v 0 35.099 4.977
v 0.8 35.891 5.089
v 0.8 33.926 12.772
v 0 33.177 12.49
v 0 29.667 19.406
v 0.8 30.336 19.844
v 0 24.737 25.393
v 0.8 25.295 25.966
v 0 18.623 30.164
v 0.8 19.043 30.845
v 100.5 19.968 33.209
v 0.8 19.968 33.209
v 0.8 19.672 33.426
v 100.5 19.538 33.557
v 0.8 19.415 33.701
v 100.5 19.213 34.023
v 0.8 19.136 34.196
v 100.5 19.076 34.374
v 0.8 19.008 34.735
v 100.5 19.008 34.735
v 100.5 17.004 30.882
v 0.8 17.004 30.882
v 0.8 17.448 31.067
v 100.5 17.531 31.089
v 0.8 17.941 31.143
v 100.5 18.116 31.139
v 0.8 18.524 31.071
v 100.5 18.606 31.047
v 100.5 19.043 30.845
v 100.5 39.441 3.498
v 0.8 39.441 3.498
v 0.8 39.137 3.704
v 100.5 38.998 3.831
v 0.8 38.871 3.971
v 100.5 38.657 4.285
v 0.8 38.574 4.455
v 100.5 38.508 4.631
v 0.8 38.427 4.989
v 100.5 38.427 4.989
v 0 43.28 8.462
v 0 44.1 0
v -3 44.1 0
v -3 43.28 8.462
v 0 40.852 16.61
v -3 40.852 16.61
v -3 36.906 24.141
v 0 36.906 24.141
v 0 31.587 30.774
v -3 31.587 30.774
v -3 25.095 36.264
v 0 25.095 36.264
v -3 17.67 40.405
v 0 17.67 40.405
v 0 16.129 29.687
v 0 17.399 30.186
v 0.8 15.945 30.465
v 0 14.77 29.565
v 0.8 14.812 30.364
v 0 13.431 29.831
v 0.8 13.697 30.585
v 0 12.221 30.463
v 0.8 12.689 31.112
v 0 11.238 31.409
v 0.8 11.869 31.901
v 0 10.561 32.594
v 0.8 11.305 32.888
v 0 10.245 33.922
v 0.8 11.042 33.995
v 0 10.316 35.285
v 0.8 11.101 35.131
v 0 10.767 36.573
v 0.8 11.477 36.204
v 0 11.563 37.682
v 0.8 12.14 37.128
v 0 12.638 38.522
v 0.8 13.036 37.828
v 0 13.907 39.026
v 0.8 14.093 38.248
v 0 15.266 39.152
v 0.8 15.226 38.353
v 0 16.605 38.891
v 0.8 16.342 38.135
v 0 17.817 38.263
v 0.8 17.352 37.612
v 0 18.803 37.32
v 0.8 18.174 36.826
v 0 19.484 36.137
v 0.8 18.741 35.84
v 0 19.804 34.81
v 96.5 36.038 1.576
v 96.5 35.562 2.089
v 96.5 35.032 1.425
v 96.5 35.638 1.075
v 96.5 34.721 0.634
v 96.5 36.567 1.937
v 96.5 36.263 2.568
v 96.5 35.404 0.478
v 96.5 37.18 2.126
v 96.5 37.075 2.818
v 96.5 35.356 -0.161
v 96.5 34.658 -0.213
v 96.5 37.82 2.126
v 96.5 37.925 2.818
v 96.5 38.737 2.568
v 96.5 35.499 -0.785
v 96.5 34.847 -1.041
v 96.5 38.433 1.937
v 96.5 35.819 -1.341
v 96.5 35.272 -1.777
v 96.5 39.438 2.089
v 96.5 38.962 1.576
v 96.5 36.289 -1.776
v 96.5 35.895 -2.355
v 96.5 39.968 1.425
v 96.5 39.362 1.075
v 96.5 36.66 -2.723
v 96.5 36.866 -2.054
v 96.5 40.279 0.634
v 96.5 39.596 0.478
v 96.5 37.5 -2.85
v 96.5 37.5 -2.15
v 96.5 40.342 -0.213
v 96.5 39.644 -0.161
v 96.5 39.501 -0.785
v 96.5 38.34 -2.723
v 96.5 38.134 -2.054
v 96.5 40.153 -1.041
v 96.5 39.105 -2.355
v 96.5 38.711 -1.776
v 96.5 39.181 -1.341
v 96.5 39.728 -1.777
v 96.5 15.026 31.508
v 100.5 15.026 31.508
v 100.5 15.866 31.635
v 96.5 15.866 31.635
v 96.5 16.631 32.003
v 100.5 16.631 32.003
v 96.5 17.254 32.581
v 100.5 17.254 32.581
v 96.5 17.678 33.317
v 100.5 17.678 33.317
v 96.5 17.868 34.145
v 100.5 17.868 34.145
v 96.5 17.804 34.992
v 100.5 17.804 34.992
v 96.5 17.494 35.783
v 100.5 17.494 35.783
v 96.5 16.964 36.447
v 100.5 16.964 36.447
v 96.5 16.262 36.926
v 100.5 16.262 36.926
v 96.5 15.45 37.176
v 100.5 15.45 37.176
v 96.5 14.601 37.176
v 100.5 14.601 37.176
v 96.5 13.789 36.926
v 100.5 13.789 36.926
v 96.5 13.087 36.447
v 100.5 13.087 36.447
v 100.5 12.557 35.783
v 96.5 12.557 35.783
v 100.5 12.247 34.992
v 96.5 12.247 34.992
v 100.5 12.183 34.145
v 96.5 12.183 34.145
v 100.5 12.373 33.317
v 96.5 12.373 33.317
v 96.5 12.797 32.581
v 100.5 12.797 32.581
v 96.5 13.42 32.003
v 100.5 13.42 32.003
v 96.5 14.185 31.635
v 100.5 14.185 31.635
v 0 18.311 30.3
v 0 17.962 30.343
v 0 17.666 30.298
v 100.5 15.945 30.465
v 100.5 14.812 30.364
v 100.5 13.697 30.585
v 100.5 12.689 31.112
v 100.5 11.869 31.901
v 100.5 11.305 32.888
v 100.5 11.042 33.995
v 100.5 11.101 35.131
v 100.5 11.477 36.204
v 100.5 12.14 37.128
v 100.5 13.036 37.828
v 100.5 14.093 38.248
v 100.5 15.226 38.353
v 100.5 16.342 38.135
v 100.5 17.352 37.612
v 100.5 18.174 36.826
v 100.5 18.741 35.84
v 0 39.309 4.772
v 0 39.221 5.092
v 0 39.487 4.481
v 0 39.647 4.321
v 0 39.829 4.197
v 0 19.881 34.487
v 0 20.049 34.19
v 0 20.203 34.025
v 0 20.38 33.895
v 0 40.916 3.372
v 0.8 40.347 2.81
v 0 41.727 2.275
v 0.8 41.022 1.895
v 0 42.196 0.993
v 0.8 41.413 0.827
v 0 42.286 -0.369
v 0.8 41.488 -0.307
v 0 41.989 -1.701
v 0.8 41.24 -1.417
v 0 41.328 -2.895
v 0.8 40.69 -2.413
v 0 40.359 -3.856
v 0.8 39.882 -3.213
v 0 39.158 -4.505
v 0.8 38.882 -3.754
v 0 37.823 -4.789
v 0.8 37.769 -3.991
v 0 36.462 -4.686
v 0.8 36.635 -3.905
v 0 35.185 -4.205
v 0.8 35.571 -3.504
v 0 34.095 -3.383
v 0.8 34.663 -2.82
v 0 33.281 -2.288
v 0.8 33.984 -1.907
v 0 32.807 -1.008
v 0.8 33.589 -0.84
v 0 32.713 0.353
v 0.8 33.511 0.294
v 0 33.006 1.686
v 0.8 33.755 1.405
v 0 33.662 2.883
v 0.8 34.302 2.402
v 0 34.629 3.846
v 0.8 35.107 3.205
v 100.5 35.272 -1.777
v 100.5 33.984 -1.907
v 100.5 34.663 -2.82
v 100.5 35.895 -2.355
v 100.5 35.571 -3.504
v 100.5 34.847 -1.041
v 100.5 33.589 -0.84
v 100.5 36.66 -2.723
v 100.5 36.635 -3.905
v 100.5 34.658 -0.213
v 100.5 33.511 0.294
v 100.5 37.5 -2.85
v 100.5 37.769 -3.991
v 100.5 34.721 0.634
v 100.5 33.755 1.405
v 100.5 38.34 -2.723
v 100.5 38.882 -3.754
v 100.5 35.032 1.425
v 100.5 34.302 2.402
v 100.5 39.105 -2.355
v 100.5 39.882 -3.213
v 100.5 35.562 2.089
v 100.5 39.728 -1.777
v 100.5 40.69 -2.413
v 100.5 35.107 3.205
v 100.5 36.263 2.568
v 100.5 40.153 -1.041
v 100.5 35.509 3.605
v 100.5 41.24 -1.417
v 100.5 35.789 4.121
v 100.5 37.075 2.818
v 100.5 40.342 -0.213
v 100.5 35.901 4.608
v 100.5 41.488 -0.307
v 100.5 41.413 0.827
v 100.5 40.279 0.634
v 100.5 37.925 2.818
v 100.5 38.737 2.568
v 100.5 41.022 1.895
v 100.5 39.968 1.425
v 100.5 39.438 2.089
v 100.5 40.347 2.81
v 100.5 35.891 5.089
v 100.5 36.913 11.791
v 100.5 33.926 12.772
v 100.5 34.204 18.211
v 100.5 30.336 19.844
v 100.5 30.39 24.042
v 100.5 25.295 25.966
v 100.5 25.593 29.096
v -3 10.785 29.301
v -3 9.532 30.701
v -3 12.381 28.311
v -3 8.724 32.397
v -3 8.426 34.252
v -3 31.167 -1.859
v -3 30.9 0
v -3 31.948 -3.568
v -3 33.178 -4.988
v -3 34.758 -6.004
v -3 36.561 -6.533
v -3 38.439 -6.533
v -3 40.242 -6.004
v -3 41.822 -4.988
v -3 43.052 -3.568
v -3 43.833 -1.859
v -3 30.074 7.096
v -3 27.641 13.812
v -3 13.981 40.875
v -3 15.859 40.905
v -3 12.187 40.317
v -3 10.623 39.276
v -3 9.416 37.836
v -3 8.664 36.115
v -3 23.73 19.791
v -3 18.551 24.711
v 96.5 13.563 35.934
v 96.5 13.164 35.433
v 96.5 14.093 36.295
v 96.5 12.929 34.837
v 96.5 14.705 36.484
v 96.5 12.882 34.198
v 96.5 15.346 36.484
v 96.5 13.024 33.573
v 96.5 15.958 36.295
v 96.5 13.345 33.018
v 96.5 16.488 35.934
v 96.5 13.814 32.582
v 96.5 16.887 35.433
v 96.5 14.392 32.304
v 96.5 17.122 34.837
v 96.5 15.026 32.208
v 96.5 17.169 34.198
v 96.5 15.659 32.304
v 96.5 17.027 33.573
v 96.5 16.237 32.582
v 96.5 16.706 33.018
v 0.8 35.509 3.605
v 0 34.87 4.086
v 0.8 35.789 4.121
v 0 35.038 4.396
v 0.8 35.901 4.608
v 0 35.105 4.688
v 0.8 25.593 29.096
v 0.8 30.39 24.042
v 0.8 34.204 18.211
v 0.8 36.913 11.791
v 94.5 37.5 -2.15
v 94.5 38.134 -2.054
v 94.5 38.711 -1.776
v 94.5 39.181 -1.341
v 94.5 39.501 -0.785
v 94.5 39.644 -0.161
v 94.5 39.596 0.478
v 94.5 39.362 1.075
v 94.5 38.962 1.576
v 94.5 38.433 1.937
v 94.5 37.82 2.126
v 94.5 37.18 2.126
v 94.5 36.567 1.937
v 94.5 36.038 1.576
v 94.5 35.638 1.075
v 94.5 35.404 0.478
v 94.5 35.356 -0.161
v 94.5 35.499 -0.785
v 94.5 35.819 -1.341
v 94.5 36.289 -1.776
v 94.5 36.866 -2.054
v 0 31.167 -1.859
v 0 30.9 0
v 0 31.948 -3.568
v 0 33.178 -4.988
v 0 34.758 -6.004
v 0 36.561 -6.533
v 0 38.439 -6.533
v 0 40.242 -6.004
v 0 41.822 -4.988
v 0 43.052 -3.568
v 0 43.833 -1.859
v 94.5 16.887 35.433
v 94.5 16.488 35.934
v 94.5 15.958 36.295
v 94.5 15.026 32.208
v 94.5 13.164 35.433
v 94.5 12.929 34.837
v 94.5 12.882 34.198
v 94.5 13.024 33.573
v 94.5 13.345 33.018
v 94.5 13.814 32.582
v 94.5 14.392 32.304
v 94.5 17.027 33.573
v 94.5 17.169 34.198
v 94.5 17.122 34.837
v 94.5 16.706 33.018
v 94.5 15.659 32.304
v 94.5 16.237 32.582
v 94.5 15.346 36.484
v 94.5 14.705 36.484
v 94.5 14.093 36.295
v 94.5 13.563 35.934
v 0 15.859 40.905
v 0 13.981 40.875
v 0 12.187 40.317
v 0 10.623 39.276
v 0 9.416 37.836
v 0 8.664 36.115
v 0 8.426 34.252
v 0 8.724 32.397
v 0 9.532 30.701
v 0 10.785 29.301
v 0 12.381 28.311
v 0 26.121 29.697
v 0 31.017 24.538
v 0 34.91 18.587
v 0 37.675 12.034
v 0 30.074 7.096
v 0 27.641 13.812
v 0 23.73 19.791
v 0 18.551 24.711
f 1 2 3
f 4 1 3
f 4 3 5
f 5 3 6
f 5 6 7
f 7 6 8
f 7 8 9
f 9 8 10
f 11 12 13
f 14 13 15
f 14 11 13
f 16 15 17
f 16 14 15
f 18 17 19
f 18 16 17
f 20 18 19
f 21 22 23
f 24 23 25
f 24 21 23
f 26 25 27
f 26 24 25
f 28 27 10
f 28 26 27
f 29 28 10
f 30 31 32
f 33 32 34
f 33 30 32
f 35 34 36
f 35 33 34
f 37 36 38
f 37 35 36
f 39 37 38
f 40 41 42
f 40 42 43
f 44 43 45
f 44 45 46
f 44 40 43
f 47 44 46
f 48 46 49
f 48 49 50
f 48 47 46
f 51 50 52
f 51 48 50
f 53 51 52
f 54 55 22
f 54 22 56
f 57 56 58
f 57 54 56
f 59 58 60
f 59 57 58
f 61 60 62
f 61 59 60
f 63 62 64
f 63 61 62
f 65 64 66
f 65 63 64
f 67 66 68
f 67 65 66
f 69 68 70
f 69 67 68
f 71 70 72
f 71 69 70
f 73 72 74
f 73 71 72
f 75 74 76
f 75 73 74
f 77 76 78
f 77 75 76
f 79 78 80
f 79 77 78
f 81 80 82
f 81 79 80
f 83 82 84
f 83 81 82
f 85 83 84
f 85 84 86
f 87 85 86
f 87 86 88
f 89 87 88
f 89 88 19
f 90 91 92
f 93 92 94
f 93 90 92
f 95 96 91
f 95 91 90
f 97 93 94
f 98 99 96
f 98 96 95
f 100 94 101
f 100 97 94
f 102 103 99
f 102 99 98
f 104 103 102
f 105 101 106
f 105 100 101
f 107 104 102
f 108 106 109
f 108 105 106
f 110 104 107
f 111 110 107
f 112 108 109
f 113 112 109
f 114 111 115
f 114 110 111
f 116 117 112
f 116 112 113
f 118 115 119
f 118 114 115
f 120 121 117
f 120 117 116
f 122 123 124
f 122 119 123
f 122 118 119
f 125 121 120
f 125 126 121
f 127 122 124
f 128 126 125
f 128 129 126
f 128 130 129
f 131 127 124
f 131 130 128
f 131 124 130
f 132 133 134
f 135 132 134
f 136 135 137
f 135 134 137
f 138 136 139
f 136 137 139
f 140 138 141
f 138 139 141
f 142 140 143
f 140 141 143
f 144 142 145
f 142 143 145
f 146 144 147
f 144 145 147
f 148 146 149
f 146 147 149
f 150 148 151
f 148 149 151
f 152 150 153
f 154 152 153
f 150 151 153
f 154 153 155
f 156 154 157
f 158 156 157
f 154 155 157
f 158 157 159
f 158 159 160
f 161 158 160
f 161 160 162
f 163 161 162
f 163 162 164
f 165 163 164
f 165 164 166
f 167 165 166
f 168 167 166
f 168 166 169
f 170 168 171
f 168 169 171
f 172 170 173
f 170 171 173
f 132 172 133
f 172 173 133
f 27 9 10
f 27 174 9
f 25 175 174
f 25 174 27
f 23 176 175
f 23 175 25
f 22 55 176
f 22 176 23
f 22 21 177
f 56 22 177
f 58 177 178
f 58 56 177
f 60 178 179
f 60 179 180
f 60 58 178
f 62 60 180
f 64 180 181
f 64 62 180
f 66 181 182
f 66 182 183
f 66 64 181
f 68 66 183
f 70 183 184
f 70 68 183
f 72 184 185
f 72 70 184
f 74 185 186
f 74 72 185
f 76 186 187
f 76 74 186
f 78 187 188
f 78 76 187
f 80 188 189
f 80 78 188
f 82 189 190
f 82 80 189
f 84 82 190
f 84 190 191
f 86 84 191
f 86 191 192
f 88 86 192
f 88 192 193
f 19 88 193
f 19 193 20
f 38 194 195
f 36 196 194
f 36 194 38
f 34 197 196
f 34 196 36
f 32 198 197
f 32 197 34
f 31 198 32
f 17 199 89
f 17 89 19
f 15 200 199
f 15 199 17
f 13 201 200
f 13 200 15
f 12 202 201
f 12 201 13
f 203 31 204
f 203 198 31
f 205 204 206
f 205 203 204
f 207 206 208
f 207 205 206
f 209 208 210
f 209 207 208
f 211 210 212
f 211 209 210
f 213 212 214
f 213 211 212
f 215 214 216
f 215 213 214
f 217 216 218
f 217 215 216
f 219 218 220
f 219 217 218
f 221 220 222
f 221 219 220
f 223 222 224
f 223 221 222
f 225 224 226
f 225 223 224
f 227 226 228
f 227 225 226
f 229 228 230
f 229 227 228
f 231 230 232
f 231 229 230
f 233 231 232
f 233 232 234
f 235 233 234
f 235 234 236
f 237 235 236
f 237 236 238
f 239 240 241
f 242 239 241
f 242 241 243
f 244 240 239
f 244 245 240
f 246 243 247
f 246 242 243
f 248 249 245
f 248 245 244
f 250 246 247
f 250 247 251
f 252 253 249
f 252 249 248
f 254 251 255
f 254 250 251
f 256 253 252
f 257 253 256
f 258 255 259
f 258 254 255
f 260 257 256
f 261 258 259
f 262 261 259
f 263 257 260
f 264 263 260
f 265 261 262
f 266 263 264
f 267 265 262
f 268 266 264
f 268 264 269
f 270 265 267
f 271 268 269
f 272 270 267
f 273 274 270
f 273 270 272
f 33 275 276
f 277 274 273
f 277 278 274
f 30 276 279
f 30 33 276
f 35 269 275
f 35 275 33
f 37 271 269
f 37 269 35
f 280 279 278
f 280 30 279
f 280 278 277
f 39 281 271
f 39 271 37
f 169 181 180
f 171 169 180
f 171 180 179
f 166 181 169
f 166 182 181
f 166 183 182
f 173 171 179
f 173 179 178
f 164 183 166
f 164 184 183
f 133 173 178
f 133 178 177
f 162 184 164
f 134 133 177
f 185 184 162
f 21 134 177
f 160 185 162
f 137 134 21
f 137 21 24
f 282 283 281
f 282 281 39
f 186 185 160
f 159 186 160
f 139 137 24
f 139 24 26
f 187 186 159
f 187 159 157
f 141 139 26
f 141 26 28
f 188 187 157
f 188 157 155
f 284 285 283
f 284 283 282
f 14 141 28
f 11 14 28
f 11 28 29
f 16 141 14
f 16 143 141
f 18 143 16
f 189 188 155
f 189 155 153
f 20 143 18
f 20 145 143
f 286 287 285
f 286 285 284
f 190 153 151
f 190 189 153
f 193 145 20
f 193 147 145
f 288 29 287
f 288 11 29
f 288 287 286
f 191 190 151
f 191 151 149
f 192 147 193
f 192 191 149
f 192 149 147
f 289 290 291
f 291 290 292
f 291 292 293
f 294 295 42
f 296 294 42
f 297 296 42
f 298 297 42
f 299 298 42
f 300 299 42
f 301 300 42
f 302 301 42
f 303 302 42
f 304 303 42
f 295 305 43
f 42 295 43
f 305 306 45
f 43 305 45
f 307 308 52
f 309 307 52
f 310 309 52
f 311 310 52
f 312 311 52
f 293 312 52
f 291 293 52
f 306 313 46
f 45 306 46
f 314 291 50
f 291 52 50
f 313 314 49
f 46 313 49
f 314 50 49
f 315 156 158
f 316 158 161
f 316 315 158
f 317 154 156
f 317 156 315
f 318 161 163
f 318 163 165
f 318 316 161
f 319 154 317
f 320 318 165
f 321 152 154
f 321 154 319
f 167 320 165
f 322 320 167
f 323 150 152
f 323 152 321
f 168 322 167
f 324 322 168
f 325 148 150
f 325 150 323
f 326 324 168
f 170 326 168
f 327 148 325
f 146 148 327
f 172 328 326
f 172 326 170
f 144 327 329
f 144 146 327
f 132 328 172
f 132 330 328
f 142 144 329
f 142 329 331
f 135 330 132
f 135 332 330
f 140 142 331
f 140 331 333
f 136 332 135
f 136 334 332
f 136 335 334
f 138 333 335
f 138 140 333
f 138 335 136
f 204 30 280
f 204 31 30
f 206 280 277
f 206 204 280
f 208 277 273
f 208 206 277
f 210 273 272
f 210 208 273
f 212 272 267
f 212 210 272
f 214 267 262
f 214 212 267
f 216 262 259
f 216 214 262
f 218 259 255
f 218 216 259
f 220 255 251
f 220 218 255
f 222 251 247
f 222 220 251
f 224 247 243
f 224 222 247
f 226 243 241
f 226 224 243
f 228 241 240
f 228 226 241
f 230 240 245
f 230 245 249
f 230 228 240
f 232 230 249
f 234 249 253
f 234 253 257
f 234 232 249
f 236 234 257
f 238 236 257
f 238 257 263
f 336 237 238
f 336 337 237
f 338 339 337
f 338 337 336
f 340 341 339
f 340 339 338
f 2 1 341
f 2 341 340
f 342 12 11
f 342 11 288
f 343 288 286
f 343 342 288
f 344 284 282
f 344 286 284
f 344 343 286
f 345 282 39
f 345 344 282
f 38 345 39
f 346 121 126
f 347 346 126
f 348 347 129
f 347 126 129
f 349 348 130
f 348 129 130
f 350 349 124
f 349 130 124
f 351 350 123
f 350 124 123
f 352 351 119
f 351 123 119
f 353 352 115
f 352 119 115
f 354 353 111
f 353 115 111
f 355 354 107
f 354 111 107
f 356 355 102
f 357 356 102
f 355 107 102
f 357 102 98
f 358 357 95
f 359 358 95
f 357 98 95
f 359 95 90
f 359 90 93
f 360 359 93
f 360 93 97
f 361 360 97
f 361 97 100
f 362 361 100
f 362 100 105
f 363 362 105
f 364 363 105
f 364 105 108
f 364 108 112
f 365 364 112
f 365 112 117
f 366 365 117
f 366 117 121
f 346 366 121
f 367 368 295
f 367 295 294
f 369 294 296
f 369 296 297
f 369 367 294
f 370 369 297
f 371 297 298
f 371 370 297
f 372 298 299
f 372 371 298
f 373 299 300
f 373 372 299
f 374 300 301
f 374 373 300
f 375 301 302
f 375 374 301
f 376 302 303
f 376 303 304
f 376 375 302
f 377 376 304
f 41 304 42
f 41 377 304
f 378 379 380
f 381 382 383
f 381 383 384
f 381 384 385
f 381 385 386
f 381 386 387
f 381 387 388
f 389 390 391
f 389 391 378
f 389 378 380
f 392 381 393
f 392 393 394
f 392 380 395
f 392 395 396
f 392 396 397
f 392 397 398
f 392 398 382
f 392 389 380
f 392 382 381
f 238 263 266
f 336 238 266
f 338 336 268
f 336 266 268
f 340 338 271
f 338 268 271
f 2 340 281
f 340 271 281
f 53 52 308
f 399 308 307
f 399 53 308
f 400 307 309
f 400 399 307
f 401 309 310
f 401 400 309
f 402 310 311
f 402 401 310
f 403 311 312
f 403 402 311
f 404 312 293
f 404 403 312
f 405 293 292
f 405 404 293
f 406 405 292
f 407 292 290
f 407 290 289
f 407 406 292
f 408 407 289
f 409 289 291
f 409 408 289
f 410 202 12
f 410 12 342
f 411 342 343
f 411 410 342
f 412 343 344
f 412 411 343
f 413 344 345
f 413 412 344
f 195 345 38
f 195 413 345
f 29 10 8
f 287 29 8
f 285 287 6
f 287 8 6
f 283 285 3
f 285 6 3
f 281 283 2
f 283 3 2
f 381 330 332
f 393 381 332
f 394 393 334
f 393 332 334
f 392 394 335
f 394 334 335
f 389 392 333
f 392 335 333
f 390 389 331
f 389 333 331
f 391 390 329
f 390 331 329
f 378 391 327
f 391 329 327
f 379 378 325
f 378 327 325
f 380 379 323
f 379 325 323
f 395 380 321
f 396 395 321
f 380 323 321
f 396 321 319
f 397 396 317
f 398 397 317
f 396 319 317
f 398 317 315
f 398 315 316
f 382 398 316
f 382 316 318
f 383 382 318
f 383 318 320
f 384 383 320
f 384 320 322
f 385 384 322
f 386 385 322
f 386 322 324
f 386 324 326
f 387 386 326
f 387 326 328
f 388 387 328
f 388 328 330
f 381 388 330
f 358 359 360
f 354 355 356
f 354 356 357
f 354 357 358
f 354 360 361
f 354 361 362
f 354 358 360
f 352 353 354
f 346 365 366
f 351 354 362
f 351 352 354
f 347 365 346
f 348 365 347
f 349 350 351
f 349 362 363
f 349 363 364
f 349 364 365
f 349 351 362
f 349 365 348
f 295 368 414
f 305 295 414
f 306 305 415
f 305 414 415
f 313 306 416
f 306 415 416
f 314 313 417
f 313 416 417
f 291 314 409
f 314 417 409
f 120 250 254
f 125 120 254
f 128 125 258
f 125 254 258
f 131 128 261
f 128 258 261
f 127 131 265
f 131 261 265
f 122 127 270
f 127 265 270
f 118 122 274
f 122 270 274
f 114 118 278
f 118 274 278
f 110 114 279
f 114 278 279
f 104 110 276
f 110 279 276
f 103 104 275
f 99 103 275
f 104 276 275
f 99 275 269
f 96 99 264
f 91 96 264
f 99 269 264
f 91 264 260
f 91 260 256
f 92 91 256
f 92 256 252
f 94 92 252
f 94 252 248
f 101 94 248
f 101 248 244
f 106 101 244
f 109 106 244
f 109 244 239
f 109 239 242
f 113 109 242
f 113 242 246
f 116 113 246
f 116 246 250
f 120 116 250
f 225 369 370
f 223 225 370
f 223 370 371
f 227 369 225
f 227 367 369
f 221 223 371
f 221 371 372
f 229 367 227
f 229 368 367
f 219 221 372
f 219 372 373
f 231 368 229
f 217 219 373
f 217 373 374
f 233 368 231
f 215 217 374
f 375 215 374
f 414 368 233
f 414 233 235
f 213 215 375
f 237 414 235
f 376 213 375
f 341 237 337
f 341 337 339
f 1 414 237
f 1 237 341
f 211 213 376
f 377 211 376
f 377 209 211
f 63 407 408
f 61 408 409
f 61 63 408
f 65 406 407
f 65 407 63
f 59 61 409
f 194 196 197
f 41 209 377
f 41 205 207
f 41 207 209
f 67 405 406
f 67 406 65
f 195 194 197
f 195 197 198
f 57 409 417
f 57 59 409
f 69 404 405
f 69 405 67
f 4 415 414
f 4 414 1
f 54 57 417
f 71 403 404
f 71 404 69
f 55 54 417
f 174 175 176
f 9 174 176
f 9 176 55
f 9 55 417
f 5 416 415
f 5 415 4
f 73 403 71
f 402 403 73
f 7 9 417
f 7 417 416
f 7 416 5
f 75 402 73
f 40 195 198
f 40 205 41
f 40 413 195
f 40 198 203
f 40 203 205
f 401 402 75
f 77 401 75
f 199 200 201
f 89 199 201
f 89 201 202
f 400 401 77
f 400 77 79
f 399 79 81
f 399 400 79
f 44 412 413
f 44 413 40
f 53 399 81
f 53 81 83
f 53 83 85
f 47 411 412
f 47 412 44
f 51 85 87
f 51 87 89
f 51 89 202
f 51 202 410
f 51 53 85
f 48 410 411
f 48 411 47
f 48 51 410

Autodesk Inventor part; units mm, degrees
ref_plane "YZ Plane" through (0, 0, 0) normal (1, 0, 0) x (0, 1, 0)
ref_plane "XZ Plane" through (0, 0, 0) normal (0, 1, 0) x (-1, 0, 0)
ref_plane "XY Plane" through (0, 0, 0) normal (0, 0, 1) x (1, 0, 0)
sketch "Sketch1" plane through (0, 0, 0) normal (1, 0, 0) x (0, 1, 0)
  arc A0 (37.5, 0) -> (15.0255, 34.3582) centre (0, 0) ccw
  circle A1 centre (15.0255, 34.3582) radius 4
  circle A2 centre (37.5, 0) radius 4
  arc A3 (33.5, 0) -> (13.4227, 30.6933) centre (0, 0) ccw
  arc A4 (41.5, 0) -> (16.6282, 38.0231) centre (0, 0) ccw
  arc A5 (30.9, 0) -> (44.1, 0) centre (37.5, 0) ccw
  arc A6 (17.6699, 40.4052) -> (12.381, 28.3112) centre (15.0255, 34.3582) ccw
  arc A7 (30.9, 0) -> (12.381, 28.3112) centre (0, 0) ccw
  arc A8 (44.1, 0) -> (17.6699, 40.4052) centre (0, 0) ccw
  circle A9 centre (37.5, 0) radius 1.25
  circle A10 centre (15.051, 34.347) radius 1.25
  arc A11 (36.0575, 3.7308) -> (17.8657, 31.5417) centre (0, 0) ccw
  arc A12 (38.5575, 3.8577) -> (18.9837, 33.7814) centre (0, 0) ccw
  dimension "d2" = 8
  dimension "d3" = 8
  dimension "d4" = 83
  dimension "d7" = 13.2
  dimension "d8" = 13.2
  dimension "d9" = 88.2
  dimension "d15" = 2.5
  dimension "d16" = 2.5
  dimension "d17" = 77.5
extrude "Extrusion1" add sketch "Sketch1" along normal blind 100.5 contours A2 A11 A1 A0 | A0 A1 A12 A2 | A2 | A1 | A9 | A10
extrude "Extrusion2" add sketch "Sketch1" against normal blind 3 contours A2 A11 A1 A0 | A0 A1 A12 A2 | A2 | A1 | A12 A1 A4 A2 | A2 A3 A1 A11 | A7 A6 A8 A5 | A9 | A10
fillet "Fillet1" radius 2 4 edges at (50.25, 36.0575, 3.7308) (50.25, 17.8657, 31.5417) (50.25, 18.9837, 33.7814) (50.25, 38.5575, 3.8577)
chamfer "Chamfer2" distance 0.8 angle 45 8 edges at (0, 37.7692, -3.9909) (0, 38.7564, 4.1228) (0, 32.4284, 21.2122) (0, 19.3063, 33.8574) (0, 11.4768, 36.204) (0, 18.0284, 31.1429) (0, 30.3363, 19.8437) (0, 35.7573, 4.0397)
sketch "Sketch2" plane through (100.5, 0, 0) normal (1, 0, 0) x (0, 0, -1)
  arc A0 (-34.7347, 19.0077) -> (-30.8815, 17.0036) centre (-34.3582, 15.0255) ccw projected
  arc A1 (-3.2054, 35.1072) -> (-3.4977, 39.4406) centre (0, 37.5) ccw projected
  circle A2 centre (-34.3582, 15.0255) radius 3.75
  circle A3 centre (0, 37.5) radius 3.75
  point P0 (0, 0)
  dimension "d22" = 7.5
  dimension "d23" = 7.5
extrude "Extrusion3" [suppressed]
sketch "Sketch3" plane through (102.8, 15.0255, 34.3582) normal (1, 0, 0) x (0, 0, -1)
  circle A0 centre (0, 0) radius 3.75 projected
  circle A1 centre (0, 0) radius 4
  circle A2 centre (34.3582, 22.4745) radius 3.75 projected
  circle A3 centre (34.3582, 22.4745) radius 4
  point P0 (34.3582, -15.0255)
  dimension "d26" = 8
  dimension "d27" = 8
extrude "Extrusion4" [suppressed]
chamfer "Chamfer3" [suppressed]
sketch "Sketch4" plane through (104.8, 15.0255, 34.3582) normal (1, 0, 0) x (0, 0, -1)
  circle A0 centre (34.3582, 22.4745) radius 2.5 projected
  circle A1 centre (0, 0) radius 2.5 projected
  arc A2 (34.3582, 22.4745) -> (0, 0) centre (34.3582, -15.0255) ccw
  line L0 (8.4634, -2.6098) -> (-7.662, 4.4422)
  line L1 (-7.662, 4.4422) -> (-8.4634, 2.6098)
  line L2 (-8.4634, 2.6098) -> (7.662, -4.4422)
  line L3 (7.662, -4.4422) -> (8.4634, -2.6098)
  line L4 (8.4634, -2.6098) -> (-8.4634, 2.6098) construction
  line L5 (-7.662, 4.4422) -> (7.662, -4.4422) construction
  line L6 (33.3582, 13.6745) -> (33.3582, 31.2745)
  line L7 (33.3582, 31.2745) -> (35.3582, 31.2745)
  line L8 (35.3582, 31.2745) -> (35.3582, 13.6745)
  line L9 (35.3582, 13.6745) -> (33.3582, 13.6745)
  line L10 (33.3582, 13.6745) -> (35.3582, 31.2745) construction
  line L11 (33.3582, 31.2745) -> (35.3582, 13.6745) construction
  point P0 (34.3582, -15.0255)
  point P1 (0, 0)
  dimension "d33" = 37.5
  dimension "d34" = 2
  dimension "d35" = 2
extrude "Extrusion5" [suppressed]
sketch "Sketch5" plane through (100.5, 0, 0) normal (1, 0, 0) x (0, 0, -1)
  arc A0 (-34.7347, 19.0077) -> (-30.8815, 17.0036) centre (-34.3582, 15.0255) ccw projected
  arc A1 (-3.2054, 35.1072) -> (-3.4977, 39.4406) centre (0, 37.5) ccw projected
  circle A2 centre (-34.3582, 15.0255) radius 2.85
  circle A3 centre (0, 37.5) radius 2.85
  point P0 (0, 0)
  dimension "d38" = 5.7
  dimension "d39" = 5.7
extrude "Extrusion6" cut sketch "Sketch5" against normal blind 4
sketch "Sketch6" plane through (96.5, 15.0255, 34.3582) normal (1, 0, 0) x (0, 0, -1)
  circle A0 centre (0, 0) radius 2.85 projected
  circle A1 centre (34.3582, 22.4745) radius 2.85 projected
  circle A2 centre (0, 0) radius 2.15
  circle A3 centre (34.3582, 22.4745) radius 2.15
  point P0 (34.3582, -15.0255)
  dimension "d42" = 4.3
  dimension "d43" = 4.3
extrude "Extrusion7" cut sketch "Sketch6" against normal blind 2 contours A2 | A3
equation "\"d23\" = d22"
equation "\"d35\" = d34"
properties part number "Mechanische_Anschlaege"
